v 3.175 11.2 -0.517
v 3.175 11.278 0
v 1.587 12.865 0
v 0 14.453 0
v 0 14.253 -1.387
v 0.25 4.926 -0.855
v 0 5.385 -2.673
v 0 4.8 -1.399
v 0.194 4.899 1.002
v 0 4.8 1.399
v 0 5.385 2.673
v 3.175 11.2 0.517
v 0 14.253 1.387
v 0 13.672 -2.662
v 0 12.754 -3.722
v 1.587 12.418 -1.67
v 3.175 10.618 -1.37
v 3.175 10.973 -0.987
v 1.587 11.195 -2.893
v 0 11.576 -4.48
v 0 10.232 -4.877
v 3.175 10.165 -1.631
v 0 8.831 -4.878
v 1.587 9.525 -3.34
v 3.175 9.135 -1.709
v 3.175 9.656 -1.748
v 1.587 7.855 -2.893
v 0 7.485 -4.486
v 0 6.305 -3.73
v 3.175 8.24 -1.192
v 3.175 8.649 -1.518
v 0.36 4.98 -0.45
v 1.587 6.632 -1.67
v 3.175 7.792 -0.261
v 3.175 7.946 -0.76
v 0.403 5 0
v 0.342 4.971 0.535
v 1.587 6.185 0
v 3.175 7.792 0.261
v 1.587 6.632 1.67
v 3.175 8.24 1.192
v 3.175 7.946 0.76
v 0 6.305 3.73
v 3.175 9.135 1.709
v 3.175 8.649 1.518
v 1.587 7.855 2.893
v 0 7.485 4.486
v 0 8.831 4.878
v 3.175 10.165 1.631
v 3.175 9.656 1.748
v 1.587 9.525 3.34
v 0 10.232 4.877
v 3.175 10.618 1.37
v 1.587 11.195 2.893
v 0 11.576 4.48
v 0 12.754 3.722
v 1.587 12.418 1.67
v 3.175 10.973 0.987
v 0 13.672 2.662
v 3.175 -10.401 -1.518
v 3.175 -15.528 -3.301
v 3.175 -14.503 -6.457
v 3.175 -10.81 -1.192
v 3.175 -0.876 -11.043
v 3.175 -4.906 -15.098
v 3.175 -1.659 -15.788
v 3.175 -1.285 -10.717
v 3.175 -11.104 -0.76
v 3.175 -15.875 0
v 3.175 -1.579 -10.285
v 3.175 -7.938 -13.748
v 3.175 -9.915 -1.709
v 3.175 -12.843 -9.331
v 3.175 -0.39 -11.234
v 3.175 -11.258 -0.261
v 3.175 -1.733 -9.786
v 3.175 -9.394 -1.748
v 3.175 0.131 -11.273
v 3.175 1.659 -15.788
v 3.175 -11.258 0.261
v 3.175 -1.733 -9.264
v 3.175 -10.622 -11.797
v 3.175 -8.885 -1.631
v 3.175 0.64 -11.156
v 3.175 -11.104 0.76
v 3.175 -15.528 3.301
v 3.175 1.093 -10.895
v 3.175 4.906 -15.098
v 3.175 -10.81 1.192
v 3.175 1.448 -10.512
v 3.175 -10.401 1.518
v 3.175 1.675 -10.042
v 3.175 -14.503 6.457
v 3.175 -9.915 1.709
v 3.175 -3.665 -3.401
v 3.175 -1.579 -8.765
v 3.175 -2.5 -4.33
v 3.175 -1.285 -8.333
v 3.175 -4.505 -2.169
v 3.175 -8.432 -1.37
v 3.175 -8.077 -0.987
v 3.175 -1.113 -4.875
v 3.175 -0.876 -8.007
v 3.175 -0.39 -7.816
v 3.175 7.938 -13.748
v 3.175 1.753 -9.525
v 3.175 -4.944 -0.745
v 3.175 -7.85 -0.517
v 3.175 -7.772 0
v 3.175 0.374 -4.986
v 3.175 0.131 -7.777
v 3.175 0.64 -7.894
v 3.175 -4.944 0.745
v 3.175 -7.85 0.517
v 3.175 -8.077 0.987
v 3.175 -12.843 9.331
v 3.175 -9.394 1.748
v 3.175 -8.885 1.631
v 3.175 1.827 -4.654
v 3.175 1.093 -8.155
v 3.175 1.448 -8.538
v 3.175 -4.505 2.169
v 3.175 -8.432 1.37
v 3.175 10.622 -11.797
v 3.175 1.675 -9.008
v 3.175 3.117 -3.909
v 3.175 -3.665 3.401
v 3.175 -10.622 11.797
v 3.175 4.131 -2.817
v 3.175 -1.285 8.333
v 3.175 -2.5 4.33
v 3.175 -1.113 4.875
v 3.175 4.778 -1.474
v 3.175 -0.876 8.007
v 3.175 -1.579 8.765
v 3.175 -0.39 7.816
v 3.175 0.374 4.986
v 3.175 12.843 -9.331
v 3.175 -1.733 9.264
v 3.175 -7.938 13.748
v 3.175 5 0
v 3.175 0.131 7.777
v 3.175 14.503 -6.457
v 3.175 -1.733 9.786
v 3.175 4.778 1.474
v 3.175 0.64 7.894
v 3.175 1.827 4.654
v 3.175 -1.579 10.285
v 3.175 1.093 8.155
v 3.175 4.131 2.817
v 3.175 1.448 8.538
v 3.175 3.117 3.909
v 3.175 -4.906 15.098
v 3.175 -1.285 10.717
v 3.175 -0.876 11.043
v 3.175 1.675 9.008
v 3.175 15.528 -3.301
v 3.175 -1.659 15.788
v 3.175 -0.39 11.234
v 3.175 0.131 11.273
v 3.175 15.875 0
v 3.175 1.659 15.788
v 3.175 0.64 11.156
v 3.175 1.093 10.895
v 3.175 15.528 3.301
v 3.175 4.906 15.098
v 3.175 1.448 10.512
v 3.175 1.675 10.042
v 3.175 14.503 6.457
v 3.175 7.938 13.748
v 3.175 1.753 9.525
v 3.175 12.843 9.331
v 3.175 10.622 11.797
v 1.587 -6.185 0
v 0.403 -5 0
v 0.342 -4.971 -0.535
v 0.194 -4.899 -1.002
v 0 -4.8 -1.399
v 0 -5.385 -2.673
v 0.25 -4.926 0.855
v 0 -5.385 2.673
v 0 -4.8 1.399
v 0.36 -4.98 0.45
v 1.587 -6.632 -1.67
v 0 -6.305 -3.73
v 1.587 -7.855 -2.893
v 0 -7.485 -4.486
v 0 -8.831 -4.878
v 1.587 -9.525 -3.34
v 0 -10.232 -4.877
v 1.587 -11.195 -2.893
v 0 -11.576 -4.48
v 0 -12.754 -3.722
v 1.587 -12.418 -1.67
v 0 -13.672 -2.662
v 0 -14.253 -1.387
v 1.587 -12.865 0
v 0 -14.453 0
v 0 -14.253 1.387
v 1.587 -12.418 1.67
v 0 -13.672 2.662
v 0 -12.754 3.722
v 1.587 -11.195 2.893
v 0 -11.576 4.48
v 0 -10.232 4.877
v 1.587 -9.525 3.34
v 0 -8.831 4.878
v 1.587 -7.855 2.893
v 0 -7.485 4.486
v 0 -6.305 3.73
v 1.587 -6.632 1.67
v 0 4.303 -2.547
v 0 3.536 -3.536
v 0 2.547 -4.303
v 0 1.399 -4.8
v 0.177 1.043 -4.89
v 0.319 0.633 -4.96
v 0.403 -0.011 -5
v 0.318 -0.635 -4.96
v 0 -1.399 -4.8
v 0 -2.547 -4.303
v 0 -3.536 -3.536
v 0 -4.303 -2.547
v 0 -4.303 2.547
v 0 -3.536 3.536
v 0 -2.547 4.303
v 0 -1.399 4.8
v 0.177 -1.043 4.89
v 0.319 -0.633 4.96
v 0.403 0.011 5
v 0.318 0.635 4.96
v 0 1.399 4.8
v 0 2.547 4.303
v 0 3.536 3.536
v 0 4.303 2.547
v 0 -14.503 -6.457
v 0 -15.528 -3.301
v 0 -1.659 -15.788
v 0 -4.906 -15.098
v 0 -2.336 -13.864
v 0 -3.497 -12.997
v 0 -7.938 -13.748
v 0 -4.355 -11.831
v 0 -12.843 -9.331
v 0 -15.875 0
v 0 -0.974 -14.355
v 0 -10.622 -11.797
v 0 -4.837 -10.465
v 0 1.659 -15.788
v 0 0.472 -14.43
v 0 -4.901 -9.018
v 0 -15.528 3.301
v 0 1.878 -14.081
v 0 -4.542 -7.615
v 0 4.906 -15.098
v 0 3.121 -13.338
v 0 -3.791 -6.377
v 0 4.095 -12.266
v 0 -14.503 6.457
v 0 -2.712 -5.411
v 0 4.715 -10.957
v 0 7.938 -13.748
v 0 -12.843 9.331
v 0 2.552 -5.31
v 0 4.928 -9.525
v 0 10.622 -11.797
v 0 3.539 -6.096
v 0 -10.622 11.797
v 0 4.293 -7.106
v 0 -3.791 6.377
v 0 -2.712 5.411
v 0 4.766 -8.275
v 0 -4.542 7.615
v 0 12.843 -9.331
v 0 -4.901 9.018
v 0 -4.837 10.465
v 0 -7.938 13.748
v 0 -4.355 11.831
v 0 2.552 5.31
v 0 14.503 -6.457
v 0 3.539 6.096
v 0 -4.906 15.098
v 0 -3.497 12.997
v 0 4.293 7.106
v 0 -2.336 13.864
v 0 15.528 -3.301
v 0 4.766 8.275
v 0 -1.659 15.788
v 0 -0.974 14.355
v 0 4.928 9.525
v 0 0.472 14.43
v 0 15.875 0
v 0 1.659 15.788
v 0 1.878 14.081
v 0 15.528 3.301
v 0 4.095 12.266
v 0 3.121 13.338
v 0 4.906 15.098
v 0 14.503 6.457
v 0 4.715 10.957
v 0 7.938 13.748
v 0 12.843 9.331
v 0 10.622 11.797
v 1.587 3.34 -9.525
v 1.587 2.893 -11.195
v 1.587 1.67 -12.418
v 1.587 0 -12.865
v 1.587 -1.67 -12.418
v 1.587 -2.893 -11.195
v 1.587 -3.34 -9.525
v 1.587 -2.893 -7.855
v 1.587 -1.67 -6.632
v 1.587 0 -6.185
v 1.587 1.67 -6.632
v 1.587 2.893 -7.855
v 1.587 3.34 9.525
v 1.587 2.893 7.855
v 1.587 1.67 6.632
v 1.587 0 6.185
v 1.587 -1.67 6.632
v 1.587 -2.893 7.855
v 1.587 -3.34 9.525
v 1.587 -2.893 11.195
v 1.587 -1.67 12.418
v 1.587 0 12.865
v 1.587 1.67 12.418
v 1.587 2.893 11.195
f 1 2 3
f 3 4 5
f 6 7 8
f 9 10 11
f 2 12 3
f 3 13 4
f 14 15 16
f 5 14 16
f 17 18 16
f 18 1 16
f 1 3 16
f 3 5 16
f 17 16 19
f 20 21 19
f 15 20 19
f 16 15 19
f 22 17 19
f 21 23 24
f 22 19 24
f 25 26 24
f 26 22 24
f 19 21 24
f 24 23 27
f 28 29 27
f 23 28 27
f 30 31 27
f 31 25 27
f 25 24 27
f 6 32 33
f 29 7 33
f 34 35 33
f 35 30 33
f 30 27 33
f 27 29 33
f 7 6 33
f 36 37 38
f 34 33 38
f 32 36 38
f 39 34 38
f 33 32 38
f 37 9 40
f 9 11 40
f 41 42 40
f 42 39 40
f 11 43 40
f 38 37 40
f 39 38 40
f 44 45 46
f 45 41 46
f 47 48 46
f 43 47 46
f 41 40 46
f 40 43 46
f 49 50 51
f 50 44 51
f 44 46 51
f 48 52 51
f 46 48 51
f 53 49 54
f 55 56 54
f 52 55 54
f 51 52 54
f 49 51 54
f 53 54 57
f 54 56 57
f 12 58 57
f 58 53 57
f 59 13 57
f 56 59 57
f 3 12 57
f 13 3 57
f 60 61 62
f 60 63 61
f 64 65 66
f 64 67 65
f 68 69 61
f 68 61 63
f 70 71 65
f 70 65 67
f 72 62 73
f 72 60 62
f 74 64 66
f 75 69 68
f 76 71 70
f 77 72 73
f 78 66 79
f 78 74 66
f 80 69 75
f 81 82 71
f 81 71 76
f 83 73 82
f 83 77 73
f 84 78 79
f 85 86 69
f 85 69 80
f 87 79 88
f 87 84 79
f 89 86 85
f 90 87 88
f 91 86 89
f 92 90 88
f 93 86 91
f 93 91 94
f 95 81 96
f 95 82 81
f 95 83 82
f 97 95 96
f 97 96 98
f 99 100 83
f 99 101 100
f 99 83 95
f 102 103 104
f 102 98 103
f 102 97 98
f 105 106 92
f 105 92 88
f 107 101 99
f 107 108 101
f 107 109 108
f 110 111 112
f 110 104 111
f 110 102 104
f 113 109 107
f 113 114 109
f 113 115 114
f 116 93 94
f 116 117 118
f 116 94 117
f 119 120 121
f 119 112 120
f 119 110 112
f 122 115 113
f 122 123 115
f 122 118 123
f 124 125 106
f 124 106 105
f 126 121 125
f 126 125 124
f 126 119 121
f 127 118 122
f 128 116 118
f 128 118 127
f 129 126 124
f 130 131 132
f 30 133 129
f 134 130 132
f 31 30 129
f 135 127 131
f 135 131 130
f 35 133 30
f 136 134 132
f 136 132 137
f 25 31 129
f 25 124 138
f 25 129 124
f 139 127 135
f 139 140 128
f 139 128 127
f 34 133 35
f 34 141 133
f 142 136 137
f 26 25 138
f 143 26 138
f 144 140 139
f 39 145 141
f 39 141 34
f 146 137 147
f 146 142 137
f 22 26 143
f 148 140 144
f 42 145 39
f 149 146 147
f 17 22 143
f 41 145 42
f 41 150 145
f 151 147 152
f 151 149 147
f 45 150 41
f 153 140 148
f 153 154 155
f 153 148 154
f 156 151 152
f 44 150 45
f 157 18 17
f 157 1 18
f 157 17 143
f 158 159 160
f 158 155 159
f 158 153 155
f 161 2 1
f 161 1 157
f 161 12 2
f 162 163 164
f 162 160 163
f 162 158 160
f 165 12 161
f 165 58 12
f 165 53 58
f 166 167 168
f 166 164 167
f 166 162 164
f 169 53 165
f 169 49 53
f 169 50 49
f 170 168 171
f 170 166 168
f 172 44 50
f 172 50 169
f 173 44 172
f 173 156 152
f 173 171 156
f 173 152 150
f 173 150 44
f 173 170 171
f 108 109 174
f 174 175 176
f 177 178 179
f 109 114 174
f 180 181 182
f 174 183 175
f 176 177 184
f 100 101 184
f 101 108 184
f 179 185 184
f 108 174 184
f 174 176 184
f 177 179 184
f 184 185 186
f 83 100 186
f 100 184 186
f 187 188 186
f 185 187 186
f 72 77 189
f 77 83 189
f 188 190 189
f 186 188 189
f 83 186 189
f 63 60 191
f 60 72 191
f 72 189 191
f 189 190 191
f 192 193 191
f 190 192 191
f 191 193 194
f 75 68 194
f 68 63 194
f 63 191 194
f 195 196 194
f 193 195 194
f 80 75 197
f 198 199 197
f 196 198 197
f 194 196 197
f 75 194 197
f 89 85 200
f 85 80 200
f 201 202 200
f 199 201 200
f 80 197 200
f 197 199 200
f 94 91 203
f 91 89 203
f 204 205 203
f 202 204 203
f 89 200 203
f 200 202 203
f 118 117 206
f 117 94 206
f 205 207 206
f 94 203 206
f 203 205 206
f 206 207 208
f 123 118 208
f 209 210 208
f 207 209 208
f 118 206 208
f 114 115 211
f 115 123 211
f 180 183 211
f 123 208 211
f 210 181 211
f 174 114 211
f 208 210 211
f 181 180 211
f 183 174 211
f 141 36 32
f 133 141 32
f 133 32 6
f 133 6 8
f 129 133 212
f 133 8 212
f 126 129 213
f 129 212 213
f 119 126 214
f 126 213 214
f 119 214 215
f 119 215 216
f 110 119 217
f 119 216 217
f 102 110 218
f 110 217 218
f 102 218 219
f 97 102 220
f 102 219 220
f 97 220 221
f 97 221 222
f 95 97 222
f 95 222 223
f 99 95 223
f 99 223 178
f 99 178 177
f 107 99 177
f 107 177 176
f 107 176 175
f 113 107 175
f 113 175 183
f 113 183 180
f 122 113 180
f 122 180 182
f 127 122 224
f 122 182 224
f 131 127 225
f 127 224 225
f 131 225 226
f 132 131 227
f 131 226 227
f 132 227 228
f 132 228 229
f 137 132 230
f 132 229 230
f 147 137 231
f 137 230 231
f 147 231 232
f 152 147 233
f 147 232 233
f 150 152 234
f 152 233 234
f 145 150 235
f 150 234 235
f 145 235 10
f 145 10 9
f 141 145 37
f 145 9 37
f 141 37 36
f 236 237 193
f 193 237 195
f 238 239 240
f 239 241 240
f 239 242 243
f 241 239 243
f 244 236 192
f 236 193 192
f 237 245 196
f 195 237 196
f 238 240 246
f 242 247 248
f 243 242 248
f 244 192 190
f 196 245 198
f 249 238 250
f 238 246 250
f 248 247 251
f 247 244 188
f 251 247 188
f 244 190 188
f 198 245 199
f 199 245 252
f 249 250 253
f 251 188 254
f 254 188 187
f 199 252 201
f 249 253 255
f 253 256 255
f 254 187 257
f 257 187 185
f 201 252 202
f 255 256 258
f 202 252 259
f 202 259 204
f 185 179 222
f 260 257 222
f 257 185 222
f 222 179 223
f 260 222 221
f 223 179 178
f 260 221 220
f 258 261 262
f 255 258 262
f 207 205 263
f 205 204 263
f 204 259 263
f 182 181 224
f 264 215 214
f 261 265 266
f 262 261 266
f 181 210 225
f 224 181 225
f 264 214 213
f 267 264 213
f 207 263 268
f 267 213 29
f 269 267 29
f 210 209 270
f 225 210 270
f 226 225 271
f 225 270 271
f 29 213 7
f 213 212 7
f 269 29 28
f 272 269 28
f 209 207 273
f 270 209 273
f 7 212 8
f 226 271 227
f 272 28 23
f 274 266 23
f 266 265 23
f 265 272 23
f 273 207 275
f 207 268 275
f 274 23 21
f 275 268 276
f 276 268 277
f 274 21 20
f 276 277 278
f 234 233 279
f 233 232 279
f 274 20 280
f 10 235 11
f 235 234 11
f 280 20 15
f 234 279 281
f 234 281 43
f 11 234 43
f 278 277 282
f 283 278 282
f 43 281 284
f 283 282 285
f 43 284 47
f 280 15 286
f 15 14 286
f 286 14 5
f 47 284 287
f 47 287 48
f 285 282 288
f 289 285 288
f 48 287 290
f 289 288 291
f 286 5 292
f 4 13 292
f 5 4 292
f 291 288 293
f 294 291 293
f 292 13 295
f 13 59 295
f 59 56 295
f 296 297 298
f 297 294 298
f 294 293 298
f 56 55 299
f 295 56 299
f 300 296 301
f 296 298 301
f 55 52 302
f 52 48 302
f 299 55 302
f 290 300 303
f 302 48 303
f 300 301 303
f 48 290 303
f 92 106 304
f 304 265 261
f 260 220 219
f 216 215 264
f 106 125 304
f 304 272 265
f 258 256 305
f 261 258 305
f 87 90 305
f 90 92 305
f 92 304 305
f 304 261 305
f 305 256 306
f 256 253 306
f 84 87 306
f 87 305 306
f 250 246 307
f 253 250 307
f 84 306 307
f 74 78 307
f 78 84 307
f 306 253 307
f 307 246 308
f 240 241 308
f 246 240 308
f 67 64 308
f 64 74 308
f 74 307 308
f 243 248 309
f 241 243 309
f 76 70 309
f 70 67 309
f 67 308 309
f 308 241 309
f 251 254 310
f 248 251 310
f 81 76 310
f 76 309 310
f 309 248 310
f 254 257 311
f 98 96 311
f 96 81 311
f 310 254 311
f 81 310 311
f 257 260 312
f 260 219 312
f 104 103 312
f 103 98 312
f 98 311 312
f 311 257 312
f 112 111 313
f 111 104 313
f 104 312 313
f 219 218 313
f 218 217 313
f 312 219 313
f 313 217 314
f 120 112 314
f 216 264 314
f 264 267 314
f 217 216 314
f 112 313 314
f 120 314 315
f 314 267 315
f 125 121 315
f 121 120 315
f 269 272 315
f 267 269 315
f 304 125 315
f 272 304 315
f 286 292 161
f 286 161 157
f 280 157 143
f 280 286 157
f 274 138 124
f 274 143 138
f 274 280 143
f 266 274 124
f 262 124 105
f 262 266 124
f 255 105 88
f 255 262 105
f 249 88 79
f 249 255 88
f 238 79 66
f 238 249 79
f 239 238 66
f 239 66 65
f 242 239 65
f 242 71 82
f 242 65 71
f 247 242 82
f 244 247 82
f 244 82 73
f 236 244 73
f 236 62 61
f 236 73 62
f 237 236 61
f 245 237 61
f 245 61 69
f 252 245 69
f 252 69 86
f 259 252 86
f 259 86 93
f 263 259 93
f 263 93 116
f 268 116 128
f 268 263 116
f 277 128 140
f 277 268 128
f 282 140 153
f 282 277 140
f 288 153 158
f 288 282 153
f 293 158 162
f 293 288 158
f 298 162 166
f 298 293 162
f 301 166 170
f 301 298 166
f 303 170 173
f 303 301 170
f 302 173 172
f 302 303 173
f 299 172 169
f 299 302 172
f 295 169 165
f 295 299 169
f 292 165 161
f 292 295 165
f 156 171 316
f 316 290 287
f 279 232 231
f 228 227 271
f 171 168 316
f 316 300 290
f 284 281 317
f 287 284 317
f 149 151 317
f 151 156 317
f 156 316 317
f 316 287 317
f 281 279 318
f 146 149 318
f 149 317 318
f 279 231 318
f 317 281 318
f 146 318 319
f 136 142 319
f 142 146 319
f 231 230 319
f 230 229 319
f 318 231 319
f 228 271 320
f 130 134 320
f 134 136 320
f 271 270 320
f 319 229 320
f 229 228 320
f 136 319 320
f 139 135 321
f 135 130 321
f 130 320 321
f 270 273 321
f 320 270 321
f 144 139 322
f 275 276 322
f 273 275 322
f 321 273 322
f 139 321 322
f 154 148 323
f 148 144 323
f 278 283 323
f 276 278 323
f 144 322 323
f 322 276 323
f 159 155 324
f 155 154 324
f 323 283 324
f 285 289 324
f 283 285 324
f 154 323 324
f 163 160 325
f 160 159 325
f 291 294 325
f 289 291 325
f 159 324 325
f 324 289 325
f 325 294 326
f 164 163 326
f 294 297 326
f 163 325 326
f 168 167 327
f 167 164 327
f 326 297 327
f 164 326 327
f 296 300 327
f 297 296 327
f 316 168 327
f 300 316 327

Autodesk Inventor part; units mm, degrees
ref_plane "YZ Plane" through (0, 0, 0) normal (1, 0, 0) x (0, 1, 0)
ref_plane "XZ Plane" through (0, 0, 0) normal (0, 1, 0) x (-1, 0, 0)
ref_plane "XY Plane" through (0, 0, 0) normal (0, 0, 1) x (1, 0, 0)
sketch "Sketch1" plane through (0, 0, 0) normal (1, 0, 0) x (0, 1, 0)
  circle A0 centre (0, 0) radius 15.875
  line L0 (0, 0) -> (15.875, 0) construction
  circle A1 centre (9.525, 0) radius 1.7526
  circle A2 centre (0, 0) radius 9.525 construction
  circle A3 centre (0, 0) radius 5
  circle A4 centre (0, 9.525) radius 1.7526
  circle A5 centre (-9.525, 0) radius 1.7526
  circle A6 centre (0, -9.525) radius 1.7526
  dimension "d0" = 31.75
  dimension "d2" = 19.05
  dimension "d1" = 3.5052
  dimension "d3" = 10
  dimension "d6" = 360
extrude "Extrusion1" add sketch "Sketch1" along normal blind 3.175
chamfer "Chamfer1" distance 3.175 angle 45 4 edges at (0, 7.7724, 0) (0, -1.7526, -9.525) (0, -11.2776, 0) (0, -1.7526, 9.525)
properties part number "Spacer" material "UHMW, Black"
